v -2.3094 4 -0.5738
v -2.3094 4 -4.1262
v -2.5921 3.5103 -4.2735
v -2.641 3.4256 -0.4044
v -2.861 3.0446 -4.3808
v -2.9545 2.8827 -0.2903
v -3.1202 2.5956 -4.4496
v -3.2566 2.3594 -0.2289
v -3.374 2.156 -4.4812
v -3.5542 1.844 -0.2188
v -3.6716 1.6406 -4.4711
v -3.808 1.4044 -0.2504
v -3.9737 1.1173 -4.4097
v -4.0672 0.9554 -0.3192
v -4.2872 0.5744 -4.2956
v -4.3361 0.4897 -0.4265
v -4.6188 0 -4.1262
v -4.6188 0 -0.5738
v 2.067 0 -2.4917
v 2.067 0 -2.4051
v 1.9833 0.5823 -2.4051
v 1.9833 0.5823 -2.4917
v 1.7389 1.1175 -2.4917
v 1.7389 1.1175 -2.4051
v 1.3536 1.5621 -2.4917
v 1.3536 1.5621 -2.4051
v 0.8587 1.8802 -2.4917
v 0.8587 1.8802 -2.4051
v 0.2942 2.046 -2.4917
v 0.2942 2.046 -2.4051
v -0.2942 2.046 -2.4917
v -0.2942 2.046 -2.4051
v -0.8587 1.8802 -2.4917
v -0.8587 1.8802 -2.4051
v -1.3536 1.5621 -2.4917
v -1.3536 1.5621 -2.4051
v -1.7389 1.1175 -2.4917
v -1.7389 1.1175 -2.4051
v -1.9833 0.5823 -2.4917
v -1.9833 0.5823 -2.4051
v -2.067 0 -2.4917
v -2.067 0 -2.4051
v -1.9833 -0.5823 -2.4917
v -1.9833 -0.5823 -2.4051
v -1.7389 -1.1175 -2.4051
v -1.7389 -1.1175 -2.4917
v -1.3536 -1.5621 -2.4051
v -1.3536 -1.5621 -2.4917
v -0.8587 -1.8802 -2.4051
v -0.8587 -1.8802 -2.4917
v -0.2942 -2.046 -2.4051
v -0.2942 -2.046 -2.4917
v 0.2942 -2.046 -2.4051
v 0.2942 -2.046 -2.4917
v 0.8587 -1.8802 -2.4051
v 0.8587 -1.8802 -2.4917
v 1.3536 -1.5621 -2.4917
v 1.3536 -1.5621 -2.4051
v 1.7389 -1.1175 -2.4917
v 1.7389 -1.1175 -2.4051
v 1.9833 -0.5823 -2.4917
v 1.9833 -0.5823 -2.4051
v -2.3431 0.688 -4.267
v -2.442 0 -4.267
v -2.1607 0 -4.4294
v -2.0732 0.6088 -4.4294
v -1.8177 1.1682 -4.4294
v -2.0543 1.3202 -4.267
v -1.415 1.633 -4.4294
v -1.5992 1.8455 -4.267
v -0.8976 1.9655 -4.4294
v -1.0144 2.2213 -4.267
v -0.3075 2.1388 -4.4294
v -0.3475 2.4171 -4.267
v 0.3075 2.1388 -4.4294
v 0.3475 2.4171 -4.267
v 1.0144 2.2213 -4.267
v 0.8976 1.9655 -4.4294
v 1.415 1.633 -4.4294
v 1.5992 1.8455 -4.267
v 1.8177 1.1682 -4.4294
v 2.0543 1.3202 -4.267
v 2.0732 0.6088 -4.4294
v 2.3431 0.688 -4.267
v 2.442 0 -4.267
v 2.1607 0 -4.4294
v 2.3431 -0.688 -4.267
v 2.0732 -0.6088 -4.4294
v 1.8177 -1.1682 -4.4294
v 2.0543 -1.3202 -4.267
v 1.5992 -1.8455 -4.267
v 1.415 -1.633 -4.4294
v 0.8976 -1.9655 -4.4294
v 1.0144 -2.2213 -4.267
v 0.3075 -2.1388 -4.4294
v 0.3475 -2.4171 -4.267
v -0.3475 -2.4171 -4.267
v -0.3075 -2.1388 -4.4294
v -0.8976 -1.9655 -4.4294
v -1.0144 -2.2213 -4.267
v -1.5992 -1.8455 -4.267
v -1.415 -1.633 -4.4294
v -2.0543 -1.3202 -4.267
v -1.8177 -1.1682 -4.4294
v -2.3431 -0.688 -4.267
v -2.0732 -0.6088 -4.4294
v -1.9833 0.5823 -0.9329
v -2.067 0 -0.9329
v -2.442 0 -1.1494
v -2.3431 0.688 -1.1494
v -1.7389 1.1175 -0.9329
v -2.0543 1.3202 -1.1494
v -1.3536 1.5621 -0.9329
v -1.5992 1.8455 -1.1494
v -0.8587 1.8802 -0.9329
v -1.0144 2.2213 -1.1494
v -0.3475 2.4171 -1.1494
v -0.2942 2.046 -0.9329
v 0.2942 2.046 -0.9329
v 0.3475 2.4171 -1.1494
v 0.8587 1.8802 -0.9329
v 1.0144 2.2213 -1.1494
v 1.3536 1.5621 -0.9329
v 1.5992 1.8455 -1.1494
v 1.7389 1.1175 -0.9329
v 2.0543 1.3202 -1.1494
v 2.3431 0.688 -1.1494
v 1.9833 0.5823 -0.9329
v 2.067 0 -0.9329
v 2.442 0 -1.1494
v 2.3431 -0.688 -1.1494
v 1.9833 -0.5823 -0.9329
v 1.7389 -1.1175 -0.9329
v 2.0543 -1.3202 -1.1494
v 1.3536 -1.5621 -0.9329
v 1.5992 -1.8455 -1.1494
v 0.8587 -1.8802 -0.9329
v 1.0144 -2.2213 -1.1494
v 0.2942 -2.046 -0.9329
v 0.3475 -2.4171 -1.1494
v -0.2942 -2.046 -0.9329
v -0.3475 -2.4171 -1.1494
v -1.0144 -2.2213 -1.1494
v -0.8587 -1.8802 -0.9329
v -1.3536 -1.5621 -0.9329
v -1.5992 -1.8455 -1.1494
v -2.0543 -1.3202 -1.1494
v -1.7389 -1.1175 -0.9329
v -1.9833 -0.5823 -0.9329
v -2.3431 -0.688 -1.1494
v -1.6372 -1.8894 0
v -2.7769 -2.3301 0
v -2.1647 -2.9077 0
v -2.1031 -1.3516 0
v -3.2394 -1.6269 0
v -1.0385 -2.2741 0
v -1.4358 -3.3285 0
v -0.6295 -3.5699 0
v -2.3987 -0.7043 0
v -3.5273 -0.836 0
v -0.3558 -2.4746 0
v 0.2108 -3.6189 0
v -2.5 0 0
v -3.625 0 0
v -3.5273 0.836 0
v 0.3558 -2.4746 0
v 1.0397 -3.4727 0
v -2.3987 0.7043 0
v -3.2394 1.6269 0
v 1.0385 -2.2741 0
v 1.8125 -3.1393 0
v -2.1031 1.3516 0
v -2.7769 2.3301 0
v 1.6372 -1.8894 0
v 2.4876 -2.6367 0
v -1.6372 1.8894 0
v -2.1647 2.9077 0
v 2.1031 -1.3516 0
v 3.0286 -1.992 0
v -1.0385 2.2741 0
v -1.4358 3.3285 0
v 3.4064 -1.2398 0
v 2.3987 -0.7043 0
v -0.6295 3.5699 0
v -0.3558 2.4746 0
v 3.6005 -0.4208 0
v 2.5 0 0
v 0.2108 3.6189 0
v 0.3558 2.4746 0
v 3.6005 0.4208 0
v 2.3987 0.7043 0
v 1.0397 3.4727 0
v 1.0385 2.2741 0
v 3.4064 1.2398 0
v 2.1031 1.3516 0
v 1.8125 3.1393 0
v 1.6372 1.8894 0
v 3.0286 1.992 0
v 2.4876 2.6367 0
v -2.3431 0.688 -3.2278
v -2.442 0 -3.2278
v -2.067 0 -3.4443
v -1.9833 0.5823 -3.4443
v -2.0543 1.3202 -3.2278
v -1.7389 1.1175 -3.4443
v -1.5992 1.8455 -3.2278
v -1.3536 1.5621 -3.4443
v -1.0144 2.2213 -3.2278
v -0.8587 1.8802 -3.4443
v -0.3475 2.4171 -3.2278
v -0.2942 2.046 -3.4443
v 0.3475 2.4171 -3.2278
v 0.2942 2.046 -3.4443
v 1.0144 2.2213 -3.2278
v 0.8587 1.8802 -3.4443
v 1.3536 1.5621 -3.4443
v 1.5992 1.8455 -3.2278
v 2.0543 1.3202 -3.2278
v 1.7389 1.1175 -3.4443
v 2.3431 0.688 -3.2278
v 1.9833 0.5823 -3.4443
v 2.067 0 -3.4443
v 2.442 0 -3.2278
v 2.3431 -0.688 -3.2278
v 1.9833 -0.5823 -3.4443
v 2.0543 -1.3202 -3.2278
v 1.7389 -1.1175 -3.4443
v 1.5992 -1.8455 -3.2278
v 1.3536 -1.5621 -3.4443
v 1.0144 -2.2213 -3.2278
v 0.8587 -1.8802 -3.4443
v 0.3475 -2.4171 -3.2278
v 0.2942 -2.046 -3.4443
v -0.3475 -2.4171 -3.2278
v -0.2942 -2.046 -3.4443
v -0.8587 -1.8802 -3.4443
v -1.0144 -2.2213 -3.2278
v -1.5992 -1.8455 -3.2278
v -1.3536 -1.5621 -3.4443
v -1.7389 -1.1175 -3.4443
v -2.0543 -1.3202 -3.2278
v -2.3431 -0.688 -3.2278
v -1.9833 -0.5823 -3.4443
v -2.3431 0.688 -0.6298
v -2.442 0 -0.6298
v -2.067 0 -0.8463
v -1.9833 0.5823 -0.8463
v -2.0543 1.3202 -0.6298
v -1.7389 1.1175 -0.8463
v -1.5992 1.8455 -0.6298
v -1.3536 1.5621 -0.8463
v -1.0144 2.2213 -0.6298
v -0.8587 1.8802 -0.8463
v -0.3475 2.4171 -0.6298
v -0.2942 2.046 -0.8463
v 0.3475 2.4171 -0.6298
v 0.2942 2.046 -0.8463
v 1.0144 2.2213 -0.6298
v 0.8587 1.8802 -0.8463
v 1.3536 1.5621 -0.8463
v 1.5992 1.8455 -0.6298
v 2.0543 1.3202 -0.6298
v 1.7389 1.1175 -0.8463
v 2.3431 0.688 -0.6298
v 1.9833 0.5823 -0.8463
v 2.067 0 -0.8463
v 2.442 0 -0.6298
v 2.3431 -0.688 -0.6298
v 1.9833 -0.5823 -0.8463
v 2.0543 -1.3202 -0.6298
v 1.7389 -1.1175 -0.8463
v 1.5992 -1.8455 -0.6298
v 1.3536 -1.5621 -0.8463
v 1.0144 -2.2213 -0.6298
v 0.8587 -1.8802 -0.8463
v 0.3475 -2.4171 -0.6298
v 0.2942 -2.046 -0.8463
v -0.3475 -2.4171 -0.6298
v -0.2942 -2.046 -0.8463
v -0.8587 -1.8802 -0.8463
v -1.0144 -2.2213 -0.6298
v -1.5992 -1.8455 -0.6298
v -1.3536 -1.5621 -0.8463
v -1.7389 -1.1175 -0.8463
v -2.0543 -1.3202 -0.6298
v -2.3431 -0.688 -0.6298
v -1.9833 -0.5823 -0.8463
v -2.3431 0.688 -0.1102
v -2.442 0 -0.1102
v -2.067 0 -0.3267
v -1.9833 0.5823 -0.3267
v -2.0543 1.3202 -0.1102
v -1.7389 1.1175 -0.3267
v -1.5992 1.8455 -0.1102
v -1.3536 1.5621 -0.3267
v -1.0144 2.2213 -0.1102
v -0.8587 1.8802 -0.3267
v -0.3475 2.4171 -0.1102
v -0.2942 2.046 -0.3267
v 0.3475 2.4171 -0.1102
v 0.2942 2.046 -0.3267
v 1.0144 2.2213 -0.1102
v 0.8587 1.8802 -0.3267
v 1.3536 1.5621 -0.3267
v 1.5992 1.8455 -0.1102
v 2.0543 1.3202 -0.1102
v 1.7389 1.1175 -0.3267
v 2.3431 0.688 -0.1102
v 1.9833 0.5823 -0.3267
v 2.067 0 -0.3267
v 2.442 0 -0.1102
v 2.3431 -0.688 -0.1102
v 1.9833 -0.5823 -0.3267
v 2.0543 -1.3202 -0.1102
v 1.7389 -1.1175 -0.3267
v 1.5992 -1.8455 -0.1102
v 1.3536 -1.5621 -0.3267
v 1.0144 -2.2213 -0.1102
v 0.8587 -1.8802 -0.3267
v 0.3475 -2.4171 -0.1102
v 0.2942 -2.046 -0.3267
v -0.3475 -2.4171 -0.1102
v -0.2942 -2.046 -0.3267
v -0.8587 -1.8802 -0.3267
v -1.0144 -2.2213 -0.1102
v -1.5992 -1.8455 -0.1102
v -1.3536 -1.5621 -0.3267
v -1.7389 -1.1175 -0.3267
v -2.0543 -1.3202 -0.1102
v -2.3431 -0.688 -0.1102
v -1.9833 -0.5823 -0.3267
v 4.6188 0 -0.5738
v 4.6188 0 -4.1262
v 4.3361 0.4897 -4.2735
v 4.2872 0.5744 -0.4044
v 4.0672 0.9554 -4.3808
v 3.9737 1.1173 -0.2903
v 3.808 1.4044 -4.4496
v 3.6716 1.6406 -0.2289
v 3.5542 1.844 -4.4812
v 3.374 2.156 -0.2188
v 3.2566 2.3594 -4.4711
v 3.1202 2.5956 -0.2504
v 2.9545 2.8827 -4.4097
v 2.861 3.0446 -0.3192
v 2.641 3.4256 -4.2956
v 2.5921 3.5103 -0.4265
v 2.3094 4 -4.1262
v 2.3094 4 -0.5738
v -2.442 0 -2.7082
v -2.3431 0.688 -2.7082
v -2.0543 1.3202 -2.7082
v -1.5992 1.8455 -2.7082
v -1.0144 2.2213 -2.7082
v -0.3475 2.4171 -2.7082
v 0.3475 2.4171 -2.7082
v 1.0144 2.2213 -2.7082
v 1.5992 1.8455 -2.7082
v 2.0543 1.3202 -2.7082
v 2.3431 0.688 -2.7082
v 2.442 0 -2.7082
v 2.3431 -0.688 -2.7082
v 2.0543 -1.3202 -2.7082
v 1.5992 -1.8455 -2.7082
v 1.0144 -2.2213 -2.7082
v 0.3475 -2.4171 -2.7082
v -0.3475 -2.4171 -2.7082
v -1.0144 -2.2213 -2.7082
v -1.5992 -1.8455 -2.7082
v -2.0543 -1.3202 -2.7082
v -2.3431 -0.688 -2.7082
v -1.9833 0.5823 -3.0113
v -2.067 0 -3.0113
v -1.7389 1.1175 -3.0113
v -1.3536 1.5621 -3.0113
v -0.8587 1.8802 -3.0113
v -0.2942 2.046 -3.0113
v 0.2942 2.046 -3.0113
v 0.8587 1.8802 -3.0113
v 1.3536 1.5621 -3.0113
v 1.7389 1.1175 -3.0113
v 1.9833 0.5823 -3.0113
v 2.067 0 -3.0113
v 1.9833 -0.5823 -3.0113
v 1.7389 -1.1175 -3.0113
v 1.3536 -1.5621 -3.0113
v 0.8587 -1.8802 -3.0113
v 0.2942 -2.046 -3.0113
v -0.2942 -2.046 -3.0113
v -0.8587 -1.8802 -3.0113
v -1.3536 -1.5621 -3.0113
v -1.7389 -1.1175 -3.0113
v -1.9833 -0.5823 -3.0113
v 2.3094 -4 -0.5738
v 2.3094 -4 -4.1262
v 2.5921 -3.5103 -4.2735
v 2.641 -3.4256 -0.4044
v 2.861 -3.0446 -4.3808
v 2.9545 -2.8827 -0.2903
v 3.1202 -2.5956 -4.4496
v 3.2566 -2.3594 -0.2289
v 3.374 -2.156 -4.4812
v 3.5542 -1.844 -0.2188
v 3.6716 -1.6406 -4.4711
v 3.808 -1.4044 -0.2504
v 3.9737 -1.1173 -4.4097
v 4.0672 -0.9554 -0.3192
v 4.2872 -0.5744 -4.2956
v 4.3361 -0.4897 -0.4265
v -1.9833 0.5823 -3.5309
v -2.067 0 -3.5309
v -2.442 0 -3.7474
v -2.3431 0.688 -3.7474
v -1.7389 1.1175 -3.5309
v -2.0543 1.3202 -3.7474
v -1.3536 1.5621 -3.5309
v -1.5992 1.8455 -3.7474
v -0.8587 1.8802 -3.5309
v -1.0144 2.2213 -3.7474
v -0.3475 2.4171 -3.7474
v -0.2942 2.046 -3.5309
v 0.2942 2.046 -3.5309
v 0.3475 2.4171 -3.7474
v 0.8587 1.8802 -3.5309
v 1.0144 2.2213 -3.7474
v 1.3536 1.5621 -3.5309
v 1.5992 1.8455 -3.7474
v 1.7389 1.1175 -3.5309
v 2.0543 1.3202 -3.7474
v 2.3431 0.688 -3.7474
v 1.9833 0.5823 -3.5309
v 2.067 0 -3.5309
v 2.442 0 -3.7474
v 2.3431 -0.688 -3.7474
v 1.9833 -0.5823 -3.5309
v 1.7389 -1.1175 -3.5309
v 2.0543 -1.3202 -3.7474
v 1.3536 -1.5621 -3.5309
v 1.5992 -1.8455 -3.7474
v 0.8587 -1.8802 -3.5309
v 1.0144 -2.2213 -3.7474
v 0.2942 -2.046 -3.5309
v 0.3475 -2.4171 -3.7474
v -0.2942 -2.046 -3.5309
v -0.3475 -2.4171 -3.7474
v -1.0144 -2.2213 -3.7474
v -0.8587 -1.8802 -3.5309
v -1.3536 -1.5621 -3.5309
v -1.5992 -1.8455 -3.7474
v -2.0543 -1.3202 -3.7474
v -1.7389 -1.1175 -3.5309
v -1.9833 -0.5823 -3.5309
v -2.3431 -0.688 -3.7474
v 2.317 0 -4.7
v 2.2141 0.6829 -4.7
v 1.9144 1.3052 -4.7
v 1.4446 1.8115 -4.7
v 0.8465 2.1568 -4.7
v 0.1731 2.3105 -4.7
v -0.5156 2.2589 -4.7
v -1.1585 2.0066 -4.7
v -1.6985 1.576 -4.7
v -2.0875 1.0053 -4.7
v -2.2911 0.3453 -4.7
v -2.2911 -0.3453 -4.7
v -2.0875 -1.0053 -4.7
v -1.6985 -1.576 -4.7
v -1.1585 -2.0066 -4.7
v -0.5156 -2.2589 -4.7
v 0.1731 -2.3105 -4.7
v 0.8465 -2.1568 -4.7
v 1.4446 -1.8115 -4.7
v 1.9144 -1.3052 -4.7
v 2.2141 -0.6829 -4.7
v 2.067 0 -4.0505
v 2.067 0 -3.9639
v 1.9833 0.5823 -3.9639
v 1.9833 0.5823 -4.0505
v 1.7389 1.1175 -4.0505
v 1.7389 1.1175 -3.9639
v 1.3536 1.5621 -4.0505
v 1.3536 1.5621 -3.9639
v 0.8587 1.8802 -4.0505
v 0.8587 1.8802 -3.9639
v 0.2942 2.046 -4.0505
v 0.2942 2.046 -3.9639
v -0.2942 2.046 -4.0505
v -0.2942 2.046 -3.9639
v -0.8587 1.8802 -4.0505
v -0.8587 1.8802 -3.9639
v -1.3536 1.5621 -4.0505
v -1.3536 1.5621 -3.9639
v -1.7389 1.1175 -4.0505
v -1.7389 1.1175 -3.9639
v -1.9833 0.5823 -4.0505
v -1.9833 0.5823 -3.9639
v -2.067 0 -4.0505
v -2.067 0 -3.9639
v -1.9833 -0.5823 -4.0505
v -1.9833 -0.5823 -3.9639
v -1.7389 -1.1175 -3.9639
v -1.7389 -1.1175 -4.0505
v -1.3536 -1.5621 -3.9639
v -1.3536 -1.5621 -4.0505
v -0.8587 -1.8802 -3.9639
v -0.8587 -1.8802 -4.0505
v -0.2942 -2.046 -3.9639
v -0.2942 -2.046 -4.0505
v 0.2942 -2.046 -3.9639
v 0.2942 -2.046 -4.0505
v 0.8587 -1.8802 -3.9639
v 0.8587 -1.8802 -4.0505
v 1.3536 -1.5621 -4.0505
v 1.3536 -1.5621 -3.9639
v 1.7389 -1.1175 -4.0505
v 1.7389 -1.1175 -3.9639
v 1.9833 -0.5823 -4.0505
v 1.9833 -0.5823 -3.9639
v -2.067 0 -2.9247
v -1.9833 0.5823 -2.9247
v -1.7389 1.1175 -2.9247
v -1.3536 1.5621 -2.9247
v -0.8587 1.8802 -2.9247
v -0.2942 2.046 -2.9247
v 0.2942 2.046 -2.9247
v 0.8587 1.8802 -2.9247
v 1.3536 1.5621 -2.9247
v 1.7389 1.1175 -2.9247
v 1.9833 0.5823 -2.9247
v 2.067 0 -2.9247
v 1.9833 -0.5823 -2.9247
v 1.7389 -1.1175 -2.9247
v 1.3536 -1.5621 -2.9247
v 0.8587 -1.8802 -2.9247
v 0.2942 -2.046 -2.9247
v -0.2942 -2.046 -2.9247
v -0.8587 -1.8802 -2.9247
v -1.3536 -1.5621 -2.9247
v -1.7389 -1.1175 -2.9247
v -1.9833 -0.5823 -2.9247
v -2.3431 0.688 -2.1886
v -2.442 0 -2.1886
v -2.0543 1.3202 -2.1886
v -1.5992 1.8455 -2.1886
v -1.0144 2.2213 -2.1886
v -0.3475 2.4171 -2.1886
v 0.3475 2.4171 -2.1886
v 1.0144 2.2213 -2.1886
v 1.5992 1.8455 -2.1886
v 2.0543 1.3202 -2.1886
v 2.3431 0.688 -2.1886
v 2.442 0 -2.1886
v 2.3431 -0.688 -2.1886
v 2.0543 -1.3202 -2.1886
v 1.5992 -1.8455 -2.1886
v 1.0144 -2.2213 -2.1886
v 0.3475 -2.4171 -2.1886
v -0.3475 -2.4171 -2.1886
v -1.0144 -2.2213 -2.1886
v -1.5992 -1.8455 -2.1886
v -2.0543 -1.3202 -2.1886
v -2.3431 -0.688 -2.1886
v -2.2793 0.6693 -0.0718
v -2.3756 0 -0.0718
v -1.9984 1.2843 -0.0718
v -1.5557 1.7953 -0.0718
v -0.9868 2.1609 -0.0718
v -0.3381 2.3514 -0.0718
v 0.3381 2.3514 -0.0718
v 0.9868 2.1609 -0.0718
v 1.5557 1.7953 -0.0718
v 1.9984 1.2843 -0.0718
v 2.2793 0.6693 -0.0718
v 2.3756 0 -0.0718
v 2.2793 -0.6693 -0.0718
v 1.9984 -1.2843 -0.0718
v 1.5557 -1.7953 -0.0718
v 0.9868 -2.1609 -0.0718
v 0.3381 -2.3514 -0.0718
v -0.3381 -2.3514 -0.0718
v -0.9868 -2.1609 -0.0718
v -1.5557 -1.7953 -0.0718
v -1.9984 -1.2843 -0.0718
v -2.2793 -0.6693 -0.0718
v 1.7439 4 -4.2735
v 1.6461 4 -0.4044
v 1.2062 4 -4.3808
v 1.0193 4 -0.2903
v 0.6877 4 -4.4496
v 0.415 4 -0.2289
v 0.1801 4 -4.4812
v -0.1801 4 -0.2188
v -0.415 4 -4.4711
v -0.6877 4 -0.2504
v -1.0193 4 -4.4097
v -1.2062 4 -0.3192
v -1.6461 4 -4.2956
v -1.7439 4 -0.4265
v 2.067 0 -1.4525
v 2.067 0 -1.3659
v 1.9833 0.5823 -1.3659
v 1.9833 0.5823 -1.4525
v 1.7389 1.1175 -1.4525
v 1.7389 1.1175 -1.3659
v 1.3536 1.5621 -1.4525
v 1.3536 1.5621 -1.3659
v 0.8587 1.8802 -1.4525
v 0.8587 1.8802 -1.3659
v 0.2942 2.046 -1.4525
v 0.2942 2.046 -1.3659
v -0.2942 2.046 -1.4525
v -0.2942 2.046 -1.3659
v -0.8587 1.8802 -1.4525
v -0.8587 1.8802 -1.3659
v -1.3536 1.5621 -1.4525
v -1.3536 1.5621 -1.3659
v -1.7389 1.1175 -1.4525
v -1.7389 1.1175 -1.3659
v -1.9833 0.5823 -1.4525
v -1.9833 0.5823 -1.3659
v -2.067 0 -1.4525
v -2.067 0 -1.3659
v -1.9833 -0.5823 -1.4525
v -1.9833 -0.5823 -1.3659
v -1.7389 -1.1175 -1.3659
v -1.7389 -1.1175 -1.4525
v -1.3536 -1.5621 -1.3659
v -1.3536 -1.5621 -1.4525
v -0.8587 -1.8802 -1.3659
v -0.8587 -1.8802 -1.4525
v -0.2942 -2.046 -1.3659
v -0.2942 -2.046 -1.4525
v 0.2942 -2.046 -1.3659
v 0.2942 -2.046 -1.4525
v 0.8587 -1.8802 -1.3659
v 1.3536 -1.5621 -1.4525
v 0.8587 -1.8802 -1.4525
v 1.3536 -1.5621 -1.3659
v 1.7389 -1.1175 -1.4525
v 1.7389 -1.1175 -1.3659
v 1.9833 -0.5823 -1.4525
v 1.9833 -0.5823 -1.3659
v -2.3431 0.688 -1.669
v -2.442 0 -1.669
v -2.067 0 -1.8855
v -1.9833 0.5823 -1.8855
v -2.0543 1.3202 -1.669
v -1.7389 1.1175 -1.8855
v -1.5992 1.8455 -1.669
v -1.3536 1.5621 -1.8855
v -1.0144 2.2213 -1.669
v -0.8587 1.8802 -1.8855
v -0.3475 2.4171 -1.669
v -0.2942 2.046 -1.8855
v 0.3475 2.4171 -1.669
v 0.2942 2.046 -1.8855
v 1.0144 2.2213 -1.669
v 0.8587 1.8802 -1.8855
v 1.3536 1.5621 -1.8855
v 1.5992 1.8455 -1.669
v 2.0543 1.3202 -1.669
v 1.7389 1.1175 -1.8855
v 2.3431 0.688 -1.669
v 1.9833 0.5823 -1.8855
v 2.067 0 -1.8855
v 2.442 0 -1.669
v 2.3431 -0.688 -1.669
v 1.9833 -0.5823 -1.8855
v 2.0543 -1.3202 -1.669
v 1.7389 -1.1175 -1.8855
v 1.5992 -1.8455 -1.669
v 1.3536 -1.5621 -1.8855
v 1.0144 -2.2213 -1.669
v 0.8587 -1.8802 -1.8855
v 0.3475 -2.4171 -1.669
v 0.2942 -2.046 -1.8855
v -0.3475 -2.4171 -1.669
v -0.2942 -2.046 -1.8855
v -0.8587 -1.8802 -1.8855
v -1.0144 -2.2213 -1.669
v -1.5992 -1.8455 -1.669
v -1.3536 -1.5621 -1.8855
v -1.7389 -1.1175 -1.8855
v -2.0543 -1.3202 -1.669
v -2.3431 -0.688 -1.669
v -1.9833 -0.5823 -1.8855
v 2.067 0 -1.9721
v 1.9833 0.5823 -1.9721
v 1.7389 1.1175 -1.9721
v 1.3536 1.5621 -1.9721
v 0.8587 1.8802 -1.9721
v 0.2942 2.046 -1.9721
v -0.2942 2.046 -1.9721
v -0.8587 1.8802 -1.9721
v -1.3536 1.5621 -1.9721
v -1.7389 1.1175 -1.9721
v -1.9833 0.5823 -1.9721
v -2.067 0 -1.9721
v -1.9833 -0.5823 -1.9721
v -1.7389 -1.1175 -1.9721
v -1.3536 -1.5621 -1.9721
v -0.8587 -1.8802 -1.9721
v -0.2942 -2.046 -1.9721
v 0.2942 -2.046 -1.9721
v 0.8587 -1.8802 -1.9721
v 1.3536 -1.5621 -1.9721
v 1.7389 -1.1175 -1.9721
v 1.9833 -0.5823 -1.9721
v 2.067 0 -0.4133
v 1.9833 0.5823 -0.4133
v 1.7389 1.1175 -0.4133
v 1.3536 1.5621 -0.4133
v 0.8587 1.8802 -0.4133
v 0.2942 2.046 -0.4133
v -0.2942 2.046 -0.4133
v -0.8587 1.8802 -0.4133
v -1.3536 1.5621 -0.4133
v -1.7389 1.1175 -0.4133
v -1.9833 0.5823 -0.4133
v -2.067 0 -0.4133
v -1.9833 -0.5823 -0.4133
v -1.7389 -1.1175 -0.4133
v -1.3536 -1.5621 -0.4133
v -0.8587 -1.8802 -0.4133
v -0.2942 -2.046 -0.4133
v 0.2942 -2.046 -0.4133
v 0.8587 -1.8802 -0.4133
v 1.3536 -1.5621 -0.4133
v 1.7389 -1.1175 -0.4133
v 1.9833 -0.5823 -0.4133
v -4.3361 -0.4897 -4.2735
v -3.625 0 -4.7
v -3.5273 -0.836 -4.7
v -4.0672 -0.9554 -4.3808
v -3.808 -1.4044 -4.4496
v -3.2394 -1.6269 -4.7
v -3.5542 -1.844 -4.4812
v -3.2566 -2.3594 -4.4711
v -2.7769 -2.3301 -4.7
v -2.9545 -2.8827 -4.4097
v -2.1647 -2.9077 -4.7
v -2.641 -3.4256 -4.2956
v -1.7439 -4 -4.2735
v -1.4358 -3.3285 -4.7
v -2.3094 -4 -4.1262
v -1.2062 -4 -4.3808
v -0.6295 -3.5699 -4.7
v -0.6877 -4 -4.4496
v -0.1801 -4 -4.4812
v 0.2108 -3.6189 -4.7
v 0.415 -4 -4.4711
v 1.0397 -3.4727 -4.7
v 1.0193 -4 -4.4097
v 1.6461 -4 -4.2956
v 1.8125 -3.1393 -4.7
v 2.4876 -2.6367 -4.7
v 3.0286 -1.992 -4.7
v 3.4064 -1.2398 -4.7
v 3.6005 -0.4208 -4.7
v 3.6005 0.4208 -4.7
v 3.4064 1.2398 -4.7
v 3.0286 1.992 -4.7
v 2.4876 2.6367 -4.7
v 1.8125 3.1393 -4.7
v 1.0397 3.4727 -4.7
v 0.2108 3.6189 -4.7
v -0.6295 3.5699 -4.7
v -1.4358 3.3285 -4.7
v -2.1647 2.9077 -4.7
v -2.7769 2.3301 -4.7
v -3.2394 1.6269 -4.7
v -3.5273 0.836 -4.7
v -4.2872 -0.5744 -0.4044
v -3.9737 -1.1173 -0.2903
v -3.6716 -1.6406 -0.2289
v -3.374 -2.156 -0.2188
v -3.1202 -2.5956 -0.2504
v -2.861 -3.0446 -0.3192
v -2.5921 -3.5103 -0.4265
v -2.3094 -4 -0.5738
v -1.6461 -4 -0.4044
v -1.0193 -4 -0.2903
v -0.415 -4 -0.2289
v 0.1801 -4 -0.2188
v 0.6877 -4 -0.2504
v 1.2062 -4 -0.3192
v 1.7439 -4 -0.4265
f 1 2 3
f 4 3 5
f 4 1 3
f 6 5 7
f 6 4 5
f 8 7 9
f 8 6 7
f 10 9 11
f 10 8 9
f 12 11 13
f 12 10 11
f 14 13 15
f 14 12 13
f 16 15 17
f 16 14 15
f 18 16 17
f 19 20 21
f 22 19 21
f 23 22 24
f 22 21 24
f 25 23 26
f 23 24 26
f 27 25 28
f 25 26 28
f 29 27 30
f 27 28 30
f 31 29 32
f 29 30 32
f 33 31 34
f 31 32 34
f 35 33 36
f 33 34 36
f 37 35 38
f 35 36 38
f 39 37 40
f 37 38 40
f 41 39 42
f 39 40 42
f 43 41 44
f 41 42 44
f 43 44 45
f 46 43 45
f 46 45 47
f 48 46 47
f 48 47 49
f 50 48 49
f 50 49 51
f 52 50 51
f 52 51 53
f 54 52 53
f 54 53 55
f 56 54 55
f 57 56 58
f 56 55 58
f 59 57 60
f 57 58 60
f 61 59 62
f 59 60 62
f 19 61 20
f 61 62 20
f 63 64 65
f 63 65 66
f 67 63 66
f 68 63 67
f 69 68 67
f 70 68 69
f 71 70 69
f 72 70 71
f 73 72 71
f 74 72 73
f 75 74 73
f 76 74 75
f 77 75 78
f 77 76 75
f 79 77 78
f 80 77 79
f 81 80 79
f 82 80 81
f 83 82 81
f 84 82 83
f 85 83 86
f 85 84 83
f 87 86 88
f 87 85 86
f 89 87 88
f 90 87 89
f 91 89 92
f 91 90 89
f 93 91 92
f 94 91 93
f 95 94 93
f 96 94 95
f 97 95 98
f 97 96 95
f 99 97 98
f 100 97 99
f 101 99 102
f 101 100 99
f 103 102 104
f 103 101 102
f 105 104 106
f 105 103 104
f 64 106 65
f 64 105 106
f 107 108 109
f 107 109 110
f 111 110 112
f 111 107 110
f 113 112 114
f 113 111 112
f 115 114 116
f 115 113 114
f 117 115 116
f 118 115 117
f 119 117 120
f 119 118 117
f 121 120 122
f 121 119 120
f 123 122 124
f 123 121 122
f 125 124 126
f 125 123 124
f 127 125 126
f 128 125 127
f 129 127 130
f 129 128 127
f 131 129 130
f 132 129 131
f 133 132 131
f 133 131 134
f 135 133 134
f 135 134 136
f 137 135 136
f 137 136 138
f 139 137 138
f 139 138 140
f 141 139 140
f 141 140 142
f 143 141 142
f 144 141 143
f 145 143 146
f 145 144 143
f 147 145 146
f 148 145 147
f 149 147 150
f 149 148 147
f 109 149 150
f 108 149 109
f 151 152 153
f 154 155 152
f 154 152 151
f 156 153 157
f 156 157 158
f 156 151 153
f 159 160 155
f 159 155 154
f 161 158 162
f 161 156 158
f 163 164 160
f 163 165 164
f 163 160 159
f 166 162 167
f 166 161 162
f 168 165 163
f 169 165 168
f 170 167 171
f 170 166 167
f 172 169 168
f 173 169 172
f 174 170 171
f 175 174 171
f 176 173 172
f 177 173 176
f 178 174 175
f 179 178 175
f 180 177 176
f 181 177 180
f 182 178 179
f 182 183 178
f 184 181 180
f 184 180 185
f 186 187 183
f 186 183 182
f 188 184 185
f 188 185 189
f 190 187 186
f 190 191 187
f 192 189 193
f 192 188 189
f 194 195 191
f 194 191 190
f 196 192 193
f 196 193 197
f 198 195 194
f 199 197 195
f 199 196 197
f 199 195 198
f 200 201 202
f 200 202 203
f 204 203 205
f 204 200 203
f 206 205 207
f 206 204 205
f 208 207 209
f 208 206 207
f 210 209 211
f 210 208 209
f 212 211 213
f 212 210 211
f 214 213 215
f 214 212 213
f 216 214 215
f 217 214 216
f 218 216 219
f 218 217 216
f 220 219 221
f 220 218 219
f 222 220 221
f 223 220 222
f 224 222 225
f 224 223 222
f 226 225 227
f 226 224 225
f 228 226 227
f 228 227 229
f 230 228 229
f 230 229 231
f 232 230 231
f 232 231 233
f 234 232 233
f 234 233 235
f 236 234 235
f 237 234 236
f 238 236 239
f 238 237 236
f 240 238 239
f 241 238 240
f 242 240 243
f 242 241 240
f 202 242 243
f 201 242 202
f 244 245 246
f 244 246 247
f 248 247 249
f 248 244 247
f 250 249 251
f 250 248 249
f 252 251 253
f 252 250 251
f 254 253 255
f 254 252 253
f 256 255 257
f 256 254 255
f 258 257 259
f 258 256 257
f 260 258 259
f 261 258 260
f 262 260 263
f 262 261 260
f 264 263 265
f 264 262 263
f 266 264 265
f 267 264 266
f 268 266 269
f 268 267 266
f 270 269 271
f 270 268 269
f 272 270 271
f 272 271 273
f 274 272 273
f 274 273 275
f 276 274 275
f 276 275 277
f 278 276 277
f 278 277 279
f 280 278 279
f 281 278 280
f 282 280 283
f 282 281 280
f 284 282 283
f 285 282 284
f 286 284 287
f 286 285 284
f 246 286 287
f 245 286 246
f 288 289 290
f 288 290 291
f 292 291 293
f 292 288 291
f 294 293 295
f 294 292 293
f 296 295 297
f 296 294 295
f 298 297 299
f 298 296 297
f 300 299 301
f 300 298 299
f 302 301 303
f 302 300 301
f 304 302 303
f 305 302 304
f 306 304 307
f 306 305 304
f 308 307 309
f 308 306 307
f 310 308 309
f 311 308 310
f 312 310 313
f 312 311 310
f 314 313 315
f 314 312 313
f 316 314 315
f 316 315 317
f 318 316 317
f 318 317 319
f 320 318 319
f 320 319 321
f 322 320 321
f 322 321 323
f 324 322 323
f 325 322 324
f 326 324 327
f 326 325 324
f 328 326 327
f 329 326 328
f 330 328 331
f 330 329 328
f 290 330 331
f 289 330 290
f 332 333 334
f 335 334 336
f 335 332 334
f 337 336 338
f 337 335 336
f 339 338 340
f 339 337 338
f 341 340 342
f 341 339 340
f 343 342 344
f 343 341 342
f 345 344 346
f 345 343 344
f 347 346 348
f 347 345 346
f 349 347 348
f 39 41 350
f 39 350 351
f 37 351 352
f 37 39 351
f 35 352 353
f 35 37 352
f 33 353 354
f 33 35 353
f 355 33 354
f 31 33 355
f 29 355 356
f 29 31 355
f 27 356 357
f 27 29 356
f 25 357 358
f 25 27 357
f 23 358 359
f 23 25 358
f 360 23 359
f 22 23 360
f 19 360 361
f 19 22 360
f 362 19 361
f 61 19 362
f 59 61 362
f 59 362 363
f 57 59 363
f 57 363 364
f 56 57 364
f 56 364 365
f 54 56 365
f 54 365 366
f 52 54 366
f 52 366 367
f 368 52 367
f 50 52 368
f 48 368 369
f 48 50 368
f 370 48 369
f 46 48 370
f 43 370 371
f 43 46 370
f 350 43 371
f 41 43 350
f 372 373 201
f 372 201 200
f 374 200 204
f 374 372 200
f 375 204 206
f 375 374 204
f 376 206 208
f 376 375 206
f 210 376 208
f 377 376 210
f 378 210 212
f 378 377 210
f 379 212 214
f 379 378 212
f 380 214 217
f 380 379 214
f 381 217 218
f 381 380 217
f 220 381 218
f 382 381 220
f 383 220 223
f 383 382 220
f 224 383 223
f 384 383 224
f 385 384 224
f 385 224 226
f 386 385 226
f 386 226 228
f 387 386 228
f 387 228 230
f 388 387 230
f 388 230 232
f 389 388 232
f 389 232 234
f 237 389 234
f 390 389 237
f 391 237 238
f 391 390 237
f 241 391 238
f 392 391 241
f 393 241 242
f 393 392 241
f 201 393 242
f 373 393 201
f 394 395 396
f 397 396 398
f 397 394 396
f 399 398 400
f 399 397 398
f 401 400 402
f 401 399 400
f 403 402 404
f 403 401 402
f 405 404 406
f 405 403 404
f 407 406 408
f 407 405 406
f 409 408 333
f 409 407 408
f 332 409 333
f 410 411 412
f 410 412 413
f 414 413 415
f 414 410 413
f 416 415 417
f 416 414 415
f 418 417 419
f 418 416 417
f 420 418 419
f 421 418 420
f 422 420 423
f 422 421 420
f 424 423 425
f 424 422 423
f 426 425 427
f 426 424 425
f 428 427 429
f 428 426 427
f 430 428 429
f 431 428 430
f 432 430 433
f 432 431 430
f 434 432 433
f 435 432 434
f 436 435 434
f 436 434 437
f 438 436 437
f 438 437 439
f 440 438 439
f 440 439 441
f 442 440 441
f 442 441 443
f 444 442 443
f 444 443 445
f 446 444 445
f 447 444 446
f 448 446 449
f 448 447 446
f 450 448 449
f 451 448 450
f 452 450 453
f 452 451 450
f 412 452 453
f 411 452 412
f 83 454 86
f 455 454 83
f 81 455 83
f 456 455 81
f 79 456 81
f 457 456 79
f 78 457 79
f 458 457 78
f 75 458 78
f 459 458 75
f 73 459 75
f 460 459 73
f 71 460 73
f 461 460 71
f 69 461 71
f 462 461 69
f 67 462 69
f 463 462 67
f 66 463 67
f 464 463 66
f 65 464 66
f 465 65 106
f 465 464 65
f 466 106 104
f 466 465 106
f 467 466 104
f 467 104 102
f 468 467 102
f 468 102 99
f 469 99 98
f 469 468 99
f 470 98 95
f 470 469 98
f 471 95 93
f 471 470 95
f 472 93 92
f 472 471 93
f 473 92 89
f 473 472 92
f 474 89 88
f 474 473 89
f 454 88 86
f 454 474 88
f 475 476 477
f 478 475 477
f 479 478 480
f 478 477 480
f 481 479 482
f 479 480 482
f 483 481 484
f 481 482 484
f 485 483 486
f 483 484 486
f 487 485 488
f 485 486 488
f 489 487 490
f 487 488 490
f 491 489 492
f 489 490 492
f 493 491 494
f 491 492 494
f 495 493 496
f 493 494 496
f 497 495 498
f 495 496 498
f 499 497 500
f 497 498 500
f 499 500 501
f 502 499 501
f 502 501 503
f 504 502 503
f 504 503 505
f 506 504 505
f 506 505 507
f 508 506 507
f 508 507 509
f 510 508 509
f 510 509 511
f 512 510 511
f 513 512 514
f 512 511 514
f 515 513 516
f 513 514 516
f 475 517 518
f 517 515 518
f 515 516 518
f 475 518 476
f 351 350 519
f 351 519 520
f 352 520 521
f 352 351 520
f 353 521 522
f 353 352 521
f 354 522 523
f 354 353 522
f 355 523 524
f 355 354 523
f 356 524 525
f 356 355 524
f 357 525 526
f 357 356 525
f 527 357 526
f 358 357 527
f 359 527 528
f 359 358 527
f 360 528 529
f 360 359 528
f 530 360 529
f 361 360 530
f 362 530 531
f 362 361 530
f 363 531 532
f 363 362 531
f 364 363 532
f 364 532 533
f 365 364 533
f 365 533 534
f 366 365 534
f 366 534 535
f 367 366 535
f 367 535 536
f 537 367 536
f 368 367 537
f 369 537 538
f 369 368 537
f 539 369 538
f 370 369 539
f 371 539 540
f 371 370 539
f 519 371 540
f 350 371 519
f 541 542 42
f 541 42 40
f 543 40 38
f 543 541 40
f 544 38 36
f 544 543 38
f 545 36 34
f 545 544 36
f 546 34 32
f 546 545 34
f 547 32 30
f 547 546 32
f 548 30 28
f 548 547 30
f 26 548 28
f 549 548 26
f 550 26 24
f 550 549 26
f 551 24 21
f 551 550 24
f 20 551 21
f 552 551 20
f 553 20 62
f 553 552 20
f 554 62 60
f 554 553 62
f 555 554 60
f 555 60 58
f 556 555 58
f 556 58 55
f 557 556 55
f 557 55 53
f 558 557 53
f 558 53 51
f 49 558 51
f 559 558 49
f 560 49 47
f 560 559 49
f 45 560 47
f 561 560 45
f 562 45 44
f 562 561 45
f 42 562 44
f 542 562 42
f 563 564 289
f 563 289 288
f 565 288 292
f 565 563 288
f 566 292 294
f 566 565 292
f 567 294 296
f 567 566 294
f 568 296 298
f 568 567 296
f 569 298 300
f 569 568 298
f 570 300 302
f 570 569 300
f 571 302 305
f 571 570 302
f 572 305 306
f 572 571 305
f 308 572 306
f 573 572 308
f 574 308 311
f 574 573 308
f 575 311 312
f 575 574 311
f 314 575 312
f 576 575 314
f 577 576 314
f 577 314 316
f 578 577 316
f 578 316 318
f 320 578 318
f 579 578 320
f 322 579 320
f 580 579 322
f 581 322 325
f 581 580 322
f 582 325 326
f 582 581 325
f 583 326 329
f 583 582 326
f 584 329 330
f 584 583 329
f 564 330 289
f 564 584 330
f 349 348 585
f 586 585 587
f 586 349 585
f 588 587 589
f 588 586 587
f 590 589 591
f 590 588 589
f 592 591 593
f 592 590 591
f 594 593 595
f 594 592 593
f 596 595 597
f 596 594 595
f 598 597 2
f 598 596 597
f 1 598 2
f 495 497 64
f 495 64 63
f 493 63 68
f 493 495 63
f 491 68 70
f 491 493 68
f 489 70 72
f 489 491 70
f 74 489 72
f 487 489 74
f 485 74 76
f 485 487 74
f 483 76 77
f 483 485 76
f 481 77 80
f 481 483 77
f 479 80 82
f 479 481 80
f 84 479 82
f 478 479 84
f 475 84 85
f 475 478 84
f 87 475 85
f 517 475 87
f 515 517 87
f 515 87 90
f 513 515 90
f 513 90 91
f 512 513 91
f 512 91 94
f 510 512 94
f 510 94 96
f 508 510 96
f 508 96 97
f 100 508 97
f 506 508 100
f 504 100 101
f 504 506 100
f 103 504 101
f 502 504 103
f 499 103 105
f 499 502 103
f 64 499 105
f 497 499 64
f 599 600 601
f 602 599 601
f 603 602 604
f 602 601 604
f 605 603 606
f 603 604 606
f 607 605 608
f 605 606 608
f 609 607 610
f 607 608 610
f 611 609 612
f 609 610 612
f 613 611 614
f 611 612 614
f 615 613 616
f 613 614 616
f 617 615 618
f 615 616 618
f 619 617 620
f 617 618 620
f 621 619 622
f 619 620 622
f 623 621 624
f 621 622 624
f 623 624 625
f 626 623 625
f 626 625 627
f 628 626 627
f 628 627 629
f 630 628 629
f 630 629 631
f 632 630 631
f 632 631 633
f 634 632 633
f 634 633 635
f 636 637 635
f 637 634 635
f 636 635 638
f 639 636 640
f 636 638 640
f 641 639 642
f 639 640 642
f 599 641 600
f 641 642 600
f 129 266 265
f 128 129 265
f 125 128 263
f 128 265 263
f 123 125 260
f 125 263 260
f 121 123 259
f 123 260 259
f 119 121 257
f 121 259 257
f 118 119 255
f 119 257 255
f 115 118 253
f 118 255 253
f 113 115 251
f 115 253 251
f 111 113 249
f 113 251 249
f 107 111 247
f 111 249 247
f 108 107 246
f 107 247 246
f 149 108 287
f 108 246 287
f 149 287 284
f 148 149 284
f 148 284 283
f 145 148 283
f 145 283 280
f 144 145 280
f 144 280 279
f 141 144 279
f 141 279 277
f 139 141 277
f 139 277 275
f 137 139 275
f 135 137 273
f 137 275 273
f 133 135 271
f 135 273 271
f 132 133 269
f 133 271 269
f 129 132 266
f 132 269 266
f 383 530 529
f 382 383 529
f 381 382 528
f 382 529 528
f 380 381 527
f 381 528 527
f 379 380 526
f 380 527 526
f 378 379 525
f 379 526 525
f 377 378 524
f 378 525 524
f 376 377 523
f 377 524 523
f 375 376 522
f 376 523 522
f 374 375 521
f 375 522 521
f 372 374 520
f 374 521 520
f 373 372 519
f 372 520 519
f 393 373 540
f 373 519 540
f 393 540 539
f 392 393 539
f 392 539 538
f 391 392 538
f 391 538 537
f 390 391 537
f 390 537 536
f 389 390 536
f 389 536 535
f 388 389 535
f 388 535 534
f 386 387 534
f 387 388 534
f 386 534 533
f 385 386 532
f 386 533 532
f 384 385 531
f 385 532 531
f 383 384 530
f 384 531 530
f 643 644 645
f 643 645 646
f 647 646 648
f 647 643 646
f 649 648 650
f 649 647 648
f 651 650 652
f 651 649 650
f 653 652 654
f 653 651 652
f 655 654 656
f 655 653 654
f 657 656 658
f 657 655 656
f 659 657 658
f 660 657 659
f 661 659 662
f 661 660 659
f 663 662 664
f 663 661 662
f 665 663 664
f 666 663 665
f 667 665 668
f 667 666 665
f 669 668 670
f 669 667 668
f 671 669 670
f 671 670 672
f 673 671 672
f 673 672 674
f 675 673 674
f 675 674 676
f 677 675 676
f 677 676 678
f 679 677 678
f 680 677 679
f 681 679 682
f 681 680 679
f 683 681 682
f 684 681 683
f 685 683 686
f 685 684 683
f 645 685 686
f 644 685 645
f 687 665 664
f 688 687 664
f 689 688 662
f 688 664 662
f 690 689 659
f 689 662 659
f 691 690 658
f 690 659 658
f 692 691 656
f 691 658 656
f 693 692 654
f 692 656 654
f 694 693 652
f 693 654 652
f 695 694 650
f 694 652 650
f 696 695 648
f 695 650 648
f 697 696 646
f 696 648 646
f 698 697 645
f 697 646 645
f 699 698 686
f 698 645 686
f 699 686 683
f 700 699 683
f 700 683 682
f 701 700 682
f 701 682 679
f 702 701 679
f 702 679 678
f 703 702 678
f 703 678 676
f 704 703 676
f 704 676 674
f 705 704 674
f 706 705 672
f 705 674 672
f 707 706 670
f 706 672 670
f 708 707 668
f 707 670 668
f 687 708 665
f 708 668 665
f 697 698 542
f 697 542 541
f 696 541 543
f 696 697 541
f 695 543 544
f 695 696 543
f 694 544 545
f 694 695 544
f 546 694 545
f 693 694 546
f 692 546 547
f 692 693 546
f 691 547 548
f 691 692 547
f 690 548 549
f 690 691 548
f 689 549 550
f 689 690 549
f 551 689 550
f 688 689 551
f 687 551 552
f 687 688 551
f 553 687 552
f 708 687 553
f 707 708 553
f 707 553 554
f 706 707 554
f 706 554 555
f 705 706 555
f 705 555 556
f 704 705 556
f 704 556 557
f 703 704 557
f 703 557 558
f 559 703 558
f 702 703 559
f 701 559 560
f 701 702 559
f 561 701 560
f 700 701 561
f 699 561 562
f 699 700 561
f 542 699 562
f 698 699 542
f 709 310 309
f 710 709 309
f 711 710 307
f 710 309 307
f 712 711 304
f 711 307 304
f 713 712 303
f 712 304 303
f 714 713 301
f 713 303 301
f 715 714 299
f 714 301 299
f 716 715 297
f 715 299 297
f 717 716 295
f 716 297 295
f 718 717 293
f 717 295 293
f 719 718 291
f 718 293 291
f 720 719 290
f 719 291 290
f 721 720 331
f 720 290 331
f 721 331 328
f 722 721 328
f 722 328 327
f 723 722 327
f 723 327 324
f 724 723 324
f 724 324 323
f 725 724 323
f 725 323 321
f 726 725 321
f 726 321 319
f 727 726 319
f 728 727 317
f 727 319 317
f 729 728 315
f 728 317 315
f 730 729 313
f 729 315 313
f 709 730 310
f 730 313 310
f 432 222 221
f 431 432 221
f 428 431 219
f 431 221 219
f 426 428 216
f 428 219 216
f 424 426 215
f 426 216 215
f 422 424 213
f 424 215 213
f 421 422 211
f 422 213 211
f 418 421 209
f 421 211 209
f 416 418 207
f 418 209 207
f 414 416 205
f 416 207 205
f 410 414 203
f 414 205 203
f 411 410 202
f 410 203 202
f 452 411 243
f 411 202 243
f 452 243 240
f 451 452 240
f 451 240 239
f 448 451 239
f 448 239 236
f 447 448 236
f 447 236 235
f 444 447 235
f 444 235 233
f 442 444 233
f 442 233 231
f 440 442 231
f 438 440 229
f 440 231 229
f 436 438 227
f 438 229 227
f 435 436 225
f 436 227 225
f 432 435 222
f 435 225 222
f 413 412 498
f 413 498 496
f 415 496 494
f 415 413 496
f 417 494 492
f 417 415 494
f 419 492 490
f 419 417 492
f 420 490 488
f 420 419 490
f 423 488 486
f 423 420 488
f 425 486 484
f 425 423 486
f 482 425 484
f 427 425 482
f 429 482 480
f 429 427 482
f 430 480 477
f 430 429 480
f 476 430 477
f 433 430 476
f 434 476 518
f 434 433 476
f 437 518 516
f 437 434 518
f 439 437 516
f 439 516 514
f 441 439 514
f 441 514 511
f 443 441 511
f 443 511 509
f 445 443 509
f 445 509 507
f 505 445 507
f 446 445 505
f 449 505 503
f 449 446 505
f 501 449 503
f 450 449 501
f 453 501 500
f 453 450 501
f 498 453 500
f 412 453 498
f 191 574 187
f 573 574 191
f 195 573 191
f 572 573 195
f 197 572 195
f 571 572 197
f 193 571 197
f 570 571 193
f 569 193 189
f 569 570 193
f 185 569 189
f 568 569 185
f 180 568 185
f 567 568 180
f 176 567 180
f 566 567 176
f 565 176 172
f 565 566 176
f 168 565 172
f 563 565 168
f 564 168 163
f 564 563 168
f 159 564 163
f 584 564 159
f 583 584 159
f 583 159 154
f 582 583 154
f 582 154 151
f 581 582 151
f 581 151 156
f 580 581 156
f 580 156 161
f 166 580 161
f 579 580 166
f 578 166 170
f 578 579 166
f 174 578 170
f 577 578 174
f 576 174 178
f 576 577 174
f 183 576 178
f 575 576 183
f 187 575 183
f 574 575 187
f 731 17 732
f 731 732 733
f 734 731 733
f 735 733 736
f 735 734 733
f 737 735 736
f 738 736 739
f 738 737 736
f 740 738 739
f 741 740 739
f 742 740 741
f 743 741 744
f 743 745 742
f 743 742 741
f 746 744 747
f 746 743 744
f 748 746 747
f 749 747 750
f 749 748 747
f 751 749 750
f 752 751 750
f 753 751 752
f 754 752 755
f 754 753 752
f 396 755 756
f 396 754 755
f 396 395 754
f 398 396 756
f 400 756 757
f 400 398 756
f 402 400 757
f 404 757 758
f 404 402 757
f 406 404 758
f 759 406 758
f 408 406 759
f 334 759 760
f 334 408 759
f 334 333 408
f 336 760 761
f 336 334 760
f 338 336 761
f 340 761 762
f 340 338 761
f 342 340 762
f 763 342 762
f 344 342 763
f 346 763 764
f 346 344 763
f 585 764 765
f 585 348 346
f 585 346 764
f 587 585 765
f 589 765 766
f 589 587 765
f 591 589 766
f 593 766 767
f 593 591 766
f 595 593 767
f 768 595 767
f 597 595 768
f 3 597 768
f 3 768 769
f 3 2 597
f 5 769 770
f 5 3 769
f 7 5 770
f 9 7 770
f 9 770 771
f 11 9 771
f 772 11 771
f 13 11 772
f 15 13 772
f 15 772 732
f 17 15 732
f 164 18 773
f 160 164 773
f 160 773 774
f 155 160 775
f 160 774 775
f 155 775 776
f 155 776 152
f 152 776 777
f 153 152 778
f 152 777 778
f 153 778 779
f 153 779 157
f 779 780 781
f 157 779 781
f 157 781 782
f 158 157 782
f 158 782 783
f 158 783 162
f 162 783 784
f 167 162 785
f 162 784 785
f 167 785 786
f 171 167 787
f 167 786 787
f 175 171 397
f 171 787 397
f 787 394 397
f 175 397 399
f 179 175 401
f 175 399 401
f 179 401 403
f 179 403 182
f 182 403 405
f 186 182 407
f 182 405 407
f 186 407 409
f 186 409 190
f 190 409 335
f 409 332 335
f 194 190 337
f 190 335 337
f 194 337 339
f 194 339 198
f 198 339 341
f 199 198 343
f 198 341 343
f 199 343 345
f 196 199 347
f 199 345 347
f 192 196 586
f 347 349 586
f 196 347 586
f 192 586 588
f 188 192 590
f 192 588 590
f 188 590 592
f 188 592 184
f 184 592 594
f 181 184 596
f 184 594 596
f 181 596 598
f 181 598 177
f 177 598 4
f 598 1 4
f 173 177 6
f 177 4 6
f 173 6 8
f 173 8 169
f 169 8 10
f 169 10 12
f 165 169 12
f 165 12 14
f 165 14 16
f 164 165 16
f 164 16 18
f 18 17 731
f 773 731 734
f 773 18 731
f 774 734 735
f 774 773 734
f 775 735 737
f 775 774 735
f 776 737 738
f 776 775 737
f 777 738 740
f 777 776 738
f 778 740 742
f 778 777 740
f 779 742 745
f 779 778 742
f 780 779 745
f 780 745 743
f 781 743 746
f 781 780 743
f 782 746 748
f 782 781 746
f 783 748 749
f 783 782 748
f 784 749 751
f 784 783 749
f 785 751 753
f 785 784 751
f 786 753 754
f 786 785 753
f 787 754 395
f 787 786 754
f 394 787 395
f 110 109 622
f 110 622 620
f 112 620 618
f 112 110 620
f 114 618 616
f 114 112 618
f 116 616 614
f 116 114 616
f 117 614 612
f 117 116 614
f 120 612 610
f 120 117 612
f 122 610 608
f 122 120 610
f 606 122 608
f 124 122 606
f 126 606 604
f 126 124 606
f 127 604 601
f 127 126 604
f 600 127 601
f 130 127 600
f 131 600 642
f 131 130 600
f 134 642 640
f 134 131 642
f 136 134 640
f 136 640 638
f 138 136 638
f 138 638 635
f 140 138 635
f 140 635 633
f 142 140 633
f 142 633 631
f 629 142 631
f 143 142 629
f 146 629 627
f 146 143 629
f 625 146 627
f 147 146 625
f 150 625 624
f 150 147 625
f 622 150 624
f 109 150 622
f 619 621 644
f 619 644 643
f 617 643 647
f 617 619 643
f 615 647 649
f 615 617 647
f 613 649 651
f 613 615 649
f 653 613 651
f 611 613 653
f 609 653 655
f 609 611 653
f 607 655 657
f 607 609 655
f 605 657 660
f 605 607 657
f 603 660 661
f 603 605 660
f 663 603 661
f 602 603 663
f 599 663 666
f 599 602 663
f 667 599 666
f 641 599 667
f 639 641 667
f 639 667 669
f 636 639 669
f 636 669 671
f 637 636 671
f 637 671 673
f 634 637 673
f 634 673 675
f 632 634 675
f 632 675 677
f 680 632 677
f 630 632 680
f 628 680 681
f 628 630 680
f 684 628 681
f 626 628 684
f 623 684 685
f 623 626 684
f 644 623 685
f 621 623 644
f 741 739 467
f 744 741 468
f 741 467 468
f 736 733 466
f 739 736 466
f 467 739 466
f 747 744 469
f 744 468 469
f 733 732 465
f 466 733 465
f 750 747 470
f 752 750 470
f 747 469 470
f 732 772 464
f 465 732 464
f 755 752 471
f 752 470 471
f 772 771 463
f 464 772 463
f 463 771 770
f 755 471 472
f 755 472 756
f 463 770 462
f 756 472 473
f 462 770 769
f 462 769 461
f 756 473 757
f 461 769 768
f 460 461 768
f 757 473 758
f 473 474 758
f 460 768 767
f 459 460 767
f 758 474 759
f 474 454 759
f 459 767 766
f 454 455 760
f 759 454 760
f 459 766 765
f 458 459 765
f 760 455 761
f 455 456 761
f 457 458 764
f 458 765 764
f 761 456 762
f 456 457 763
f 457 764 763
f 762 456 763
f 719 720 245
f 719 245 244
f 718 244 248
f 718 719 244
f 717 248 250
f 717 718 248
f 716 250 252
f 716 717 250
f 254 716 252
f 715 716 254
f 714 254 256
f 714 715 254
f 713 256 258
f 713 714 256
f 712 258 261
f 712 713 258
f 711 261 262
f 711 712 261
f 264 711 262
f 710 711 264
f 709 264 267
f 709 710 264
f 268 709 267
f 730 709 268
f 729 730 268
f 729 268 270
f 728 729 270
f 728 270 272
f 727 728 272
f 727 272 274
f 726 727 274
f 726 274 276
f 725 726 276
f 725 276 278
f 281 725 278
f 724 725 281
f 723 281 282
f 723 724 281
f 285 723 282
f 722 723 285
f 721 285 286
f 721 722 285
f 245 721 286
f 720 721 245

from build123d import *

# Parameters (mm, degrees)
SKETCH1_R               = 2.067
BASENUT_DEPTH           = 4.7
ENDCHAMFER_SIZE         = 0.433
ENDCHAMFER_SIZE2        = 0.249992667
ENDCHAMFER_PART_2_SIZE  = 0.433
ENDCHAMFER_PART_2_SIZE2 = 0.249992667
LPATTERN10_COUNT        = 9
LPATTERN10_PITCH        = 0.5196


with BuildPart() as part:
    # Sketch1 → BaseNut (new body)
    with BuildSketch(Plane.XY):
        Polygon((4.618802154, 0), (2.309401077, 4), (-2.309401077, 4), (-4.618802154, 0), (-2.309401077, -4), (2.309401077, -4), align=None)
        Circle(SKETCH1_R, mode=Mode.SUBTRACT)
    extrude(amount=-BASENUT_DEPTH)

    # Sketch2 → Double-Chamfer (revolve, cut)
    with BuildSketch(Plane(origin=(0, 0, 0), x_dir=(1, 0, 0), z_dir=(0, 1, 0))):
        Polygon((-4.618802154, 4.7), (-3.625, 4.7), (-4.618802154, 4.126228059), align=None)
        Polygon((-4.618802154, 0.573771941), (-4.618802154, 0), (-3.625, 0), align=None)
    revolve(axis=Axis((0, 0, -3.375940562), (0, 0, 1)), mode=Mode.SUBTRACT)

    # EndChamfer
    endchamfer_edges = [part.edges().sort_by_distance(p)[0] for p in [
        (-2.067, 0, -4.7),
    ]]
    endchamfer_side = [part.faces().sort_by_distance(p)[0] for p in [
        (-2.067, 0, -2.35),
    ]]
    chamfer(endchamfer_edges, length=ENDCHAMFER_SIZE, length2=ENDCHAMFER_SIZE2, reference=endchamfer_side[0])

    # EndChamfer part 2
    endchamfer_part_2_edges = [part.edges().sort_by_distance(p)[0] for p in [
        (-2.067, 0, 0),
    ]]
    endchamfer_part_2_side = [part.faces().sort_by_distance(p)[0] for p in [
        (3.522469517, 0, 0),
    ]]
    chamfer(endchamfer_part_2_edges, length=ENDCHAMFER_PART_2_SIZE, length2=ENDCHAMFER_PART_2_SIZE2, reference=endchamfer_part_2_side[0])

    # Sketch3 → Cut-Revolve10 (revolve, cut)
    with BuildSketch(Plane(origin=(0, 0, 0), x_dir=(1, 0, 0), z_dir=(0, 1, 0))):
        Polygon((-2.441989, 4.267), (-2.067, 4.0505), (-1.634, 4.0505), (-1.634, 4.4835), (-2.067, 4.4835), align=None)
    cut_revolve10 = revolve(axis=Axis((0, 0, -7.438254559), (0, 0, -1)), mode=Mode.SUBTRACT)

    # LPattern10: Cut-Revolve10 ×9
    with Locations(*[(0, 0, i * LPATTERN10_PITCH) for i in range(1, LPATTERN10_COUNT)]):
        add(cut_revolve10, mode=Mode.SUBTRACT)


solid = part.part
